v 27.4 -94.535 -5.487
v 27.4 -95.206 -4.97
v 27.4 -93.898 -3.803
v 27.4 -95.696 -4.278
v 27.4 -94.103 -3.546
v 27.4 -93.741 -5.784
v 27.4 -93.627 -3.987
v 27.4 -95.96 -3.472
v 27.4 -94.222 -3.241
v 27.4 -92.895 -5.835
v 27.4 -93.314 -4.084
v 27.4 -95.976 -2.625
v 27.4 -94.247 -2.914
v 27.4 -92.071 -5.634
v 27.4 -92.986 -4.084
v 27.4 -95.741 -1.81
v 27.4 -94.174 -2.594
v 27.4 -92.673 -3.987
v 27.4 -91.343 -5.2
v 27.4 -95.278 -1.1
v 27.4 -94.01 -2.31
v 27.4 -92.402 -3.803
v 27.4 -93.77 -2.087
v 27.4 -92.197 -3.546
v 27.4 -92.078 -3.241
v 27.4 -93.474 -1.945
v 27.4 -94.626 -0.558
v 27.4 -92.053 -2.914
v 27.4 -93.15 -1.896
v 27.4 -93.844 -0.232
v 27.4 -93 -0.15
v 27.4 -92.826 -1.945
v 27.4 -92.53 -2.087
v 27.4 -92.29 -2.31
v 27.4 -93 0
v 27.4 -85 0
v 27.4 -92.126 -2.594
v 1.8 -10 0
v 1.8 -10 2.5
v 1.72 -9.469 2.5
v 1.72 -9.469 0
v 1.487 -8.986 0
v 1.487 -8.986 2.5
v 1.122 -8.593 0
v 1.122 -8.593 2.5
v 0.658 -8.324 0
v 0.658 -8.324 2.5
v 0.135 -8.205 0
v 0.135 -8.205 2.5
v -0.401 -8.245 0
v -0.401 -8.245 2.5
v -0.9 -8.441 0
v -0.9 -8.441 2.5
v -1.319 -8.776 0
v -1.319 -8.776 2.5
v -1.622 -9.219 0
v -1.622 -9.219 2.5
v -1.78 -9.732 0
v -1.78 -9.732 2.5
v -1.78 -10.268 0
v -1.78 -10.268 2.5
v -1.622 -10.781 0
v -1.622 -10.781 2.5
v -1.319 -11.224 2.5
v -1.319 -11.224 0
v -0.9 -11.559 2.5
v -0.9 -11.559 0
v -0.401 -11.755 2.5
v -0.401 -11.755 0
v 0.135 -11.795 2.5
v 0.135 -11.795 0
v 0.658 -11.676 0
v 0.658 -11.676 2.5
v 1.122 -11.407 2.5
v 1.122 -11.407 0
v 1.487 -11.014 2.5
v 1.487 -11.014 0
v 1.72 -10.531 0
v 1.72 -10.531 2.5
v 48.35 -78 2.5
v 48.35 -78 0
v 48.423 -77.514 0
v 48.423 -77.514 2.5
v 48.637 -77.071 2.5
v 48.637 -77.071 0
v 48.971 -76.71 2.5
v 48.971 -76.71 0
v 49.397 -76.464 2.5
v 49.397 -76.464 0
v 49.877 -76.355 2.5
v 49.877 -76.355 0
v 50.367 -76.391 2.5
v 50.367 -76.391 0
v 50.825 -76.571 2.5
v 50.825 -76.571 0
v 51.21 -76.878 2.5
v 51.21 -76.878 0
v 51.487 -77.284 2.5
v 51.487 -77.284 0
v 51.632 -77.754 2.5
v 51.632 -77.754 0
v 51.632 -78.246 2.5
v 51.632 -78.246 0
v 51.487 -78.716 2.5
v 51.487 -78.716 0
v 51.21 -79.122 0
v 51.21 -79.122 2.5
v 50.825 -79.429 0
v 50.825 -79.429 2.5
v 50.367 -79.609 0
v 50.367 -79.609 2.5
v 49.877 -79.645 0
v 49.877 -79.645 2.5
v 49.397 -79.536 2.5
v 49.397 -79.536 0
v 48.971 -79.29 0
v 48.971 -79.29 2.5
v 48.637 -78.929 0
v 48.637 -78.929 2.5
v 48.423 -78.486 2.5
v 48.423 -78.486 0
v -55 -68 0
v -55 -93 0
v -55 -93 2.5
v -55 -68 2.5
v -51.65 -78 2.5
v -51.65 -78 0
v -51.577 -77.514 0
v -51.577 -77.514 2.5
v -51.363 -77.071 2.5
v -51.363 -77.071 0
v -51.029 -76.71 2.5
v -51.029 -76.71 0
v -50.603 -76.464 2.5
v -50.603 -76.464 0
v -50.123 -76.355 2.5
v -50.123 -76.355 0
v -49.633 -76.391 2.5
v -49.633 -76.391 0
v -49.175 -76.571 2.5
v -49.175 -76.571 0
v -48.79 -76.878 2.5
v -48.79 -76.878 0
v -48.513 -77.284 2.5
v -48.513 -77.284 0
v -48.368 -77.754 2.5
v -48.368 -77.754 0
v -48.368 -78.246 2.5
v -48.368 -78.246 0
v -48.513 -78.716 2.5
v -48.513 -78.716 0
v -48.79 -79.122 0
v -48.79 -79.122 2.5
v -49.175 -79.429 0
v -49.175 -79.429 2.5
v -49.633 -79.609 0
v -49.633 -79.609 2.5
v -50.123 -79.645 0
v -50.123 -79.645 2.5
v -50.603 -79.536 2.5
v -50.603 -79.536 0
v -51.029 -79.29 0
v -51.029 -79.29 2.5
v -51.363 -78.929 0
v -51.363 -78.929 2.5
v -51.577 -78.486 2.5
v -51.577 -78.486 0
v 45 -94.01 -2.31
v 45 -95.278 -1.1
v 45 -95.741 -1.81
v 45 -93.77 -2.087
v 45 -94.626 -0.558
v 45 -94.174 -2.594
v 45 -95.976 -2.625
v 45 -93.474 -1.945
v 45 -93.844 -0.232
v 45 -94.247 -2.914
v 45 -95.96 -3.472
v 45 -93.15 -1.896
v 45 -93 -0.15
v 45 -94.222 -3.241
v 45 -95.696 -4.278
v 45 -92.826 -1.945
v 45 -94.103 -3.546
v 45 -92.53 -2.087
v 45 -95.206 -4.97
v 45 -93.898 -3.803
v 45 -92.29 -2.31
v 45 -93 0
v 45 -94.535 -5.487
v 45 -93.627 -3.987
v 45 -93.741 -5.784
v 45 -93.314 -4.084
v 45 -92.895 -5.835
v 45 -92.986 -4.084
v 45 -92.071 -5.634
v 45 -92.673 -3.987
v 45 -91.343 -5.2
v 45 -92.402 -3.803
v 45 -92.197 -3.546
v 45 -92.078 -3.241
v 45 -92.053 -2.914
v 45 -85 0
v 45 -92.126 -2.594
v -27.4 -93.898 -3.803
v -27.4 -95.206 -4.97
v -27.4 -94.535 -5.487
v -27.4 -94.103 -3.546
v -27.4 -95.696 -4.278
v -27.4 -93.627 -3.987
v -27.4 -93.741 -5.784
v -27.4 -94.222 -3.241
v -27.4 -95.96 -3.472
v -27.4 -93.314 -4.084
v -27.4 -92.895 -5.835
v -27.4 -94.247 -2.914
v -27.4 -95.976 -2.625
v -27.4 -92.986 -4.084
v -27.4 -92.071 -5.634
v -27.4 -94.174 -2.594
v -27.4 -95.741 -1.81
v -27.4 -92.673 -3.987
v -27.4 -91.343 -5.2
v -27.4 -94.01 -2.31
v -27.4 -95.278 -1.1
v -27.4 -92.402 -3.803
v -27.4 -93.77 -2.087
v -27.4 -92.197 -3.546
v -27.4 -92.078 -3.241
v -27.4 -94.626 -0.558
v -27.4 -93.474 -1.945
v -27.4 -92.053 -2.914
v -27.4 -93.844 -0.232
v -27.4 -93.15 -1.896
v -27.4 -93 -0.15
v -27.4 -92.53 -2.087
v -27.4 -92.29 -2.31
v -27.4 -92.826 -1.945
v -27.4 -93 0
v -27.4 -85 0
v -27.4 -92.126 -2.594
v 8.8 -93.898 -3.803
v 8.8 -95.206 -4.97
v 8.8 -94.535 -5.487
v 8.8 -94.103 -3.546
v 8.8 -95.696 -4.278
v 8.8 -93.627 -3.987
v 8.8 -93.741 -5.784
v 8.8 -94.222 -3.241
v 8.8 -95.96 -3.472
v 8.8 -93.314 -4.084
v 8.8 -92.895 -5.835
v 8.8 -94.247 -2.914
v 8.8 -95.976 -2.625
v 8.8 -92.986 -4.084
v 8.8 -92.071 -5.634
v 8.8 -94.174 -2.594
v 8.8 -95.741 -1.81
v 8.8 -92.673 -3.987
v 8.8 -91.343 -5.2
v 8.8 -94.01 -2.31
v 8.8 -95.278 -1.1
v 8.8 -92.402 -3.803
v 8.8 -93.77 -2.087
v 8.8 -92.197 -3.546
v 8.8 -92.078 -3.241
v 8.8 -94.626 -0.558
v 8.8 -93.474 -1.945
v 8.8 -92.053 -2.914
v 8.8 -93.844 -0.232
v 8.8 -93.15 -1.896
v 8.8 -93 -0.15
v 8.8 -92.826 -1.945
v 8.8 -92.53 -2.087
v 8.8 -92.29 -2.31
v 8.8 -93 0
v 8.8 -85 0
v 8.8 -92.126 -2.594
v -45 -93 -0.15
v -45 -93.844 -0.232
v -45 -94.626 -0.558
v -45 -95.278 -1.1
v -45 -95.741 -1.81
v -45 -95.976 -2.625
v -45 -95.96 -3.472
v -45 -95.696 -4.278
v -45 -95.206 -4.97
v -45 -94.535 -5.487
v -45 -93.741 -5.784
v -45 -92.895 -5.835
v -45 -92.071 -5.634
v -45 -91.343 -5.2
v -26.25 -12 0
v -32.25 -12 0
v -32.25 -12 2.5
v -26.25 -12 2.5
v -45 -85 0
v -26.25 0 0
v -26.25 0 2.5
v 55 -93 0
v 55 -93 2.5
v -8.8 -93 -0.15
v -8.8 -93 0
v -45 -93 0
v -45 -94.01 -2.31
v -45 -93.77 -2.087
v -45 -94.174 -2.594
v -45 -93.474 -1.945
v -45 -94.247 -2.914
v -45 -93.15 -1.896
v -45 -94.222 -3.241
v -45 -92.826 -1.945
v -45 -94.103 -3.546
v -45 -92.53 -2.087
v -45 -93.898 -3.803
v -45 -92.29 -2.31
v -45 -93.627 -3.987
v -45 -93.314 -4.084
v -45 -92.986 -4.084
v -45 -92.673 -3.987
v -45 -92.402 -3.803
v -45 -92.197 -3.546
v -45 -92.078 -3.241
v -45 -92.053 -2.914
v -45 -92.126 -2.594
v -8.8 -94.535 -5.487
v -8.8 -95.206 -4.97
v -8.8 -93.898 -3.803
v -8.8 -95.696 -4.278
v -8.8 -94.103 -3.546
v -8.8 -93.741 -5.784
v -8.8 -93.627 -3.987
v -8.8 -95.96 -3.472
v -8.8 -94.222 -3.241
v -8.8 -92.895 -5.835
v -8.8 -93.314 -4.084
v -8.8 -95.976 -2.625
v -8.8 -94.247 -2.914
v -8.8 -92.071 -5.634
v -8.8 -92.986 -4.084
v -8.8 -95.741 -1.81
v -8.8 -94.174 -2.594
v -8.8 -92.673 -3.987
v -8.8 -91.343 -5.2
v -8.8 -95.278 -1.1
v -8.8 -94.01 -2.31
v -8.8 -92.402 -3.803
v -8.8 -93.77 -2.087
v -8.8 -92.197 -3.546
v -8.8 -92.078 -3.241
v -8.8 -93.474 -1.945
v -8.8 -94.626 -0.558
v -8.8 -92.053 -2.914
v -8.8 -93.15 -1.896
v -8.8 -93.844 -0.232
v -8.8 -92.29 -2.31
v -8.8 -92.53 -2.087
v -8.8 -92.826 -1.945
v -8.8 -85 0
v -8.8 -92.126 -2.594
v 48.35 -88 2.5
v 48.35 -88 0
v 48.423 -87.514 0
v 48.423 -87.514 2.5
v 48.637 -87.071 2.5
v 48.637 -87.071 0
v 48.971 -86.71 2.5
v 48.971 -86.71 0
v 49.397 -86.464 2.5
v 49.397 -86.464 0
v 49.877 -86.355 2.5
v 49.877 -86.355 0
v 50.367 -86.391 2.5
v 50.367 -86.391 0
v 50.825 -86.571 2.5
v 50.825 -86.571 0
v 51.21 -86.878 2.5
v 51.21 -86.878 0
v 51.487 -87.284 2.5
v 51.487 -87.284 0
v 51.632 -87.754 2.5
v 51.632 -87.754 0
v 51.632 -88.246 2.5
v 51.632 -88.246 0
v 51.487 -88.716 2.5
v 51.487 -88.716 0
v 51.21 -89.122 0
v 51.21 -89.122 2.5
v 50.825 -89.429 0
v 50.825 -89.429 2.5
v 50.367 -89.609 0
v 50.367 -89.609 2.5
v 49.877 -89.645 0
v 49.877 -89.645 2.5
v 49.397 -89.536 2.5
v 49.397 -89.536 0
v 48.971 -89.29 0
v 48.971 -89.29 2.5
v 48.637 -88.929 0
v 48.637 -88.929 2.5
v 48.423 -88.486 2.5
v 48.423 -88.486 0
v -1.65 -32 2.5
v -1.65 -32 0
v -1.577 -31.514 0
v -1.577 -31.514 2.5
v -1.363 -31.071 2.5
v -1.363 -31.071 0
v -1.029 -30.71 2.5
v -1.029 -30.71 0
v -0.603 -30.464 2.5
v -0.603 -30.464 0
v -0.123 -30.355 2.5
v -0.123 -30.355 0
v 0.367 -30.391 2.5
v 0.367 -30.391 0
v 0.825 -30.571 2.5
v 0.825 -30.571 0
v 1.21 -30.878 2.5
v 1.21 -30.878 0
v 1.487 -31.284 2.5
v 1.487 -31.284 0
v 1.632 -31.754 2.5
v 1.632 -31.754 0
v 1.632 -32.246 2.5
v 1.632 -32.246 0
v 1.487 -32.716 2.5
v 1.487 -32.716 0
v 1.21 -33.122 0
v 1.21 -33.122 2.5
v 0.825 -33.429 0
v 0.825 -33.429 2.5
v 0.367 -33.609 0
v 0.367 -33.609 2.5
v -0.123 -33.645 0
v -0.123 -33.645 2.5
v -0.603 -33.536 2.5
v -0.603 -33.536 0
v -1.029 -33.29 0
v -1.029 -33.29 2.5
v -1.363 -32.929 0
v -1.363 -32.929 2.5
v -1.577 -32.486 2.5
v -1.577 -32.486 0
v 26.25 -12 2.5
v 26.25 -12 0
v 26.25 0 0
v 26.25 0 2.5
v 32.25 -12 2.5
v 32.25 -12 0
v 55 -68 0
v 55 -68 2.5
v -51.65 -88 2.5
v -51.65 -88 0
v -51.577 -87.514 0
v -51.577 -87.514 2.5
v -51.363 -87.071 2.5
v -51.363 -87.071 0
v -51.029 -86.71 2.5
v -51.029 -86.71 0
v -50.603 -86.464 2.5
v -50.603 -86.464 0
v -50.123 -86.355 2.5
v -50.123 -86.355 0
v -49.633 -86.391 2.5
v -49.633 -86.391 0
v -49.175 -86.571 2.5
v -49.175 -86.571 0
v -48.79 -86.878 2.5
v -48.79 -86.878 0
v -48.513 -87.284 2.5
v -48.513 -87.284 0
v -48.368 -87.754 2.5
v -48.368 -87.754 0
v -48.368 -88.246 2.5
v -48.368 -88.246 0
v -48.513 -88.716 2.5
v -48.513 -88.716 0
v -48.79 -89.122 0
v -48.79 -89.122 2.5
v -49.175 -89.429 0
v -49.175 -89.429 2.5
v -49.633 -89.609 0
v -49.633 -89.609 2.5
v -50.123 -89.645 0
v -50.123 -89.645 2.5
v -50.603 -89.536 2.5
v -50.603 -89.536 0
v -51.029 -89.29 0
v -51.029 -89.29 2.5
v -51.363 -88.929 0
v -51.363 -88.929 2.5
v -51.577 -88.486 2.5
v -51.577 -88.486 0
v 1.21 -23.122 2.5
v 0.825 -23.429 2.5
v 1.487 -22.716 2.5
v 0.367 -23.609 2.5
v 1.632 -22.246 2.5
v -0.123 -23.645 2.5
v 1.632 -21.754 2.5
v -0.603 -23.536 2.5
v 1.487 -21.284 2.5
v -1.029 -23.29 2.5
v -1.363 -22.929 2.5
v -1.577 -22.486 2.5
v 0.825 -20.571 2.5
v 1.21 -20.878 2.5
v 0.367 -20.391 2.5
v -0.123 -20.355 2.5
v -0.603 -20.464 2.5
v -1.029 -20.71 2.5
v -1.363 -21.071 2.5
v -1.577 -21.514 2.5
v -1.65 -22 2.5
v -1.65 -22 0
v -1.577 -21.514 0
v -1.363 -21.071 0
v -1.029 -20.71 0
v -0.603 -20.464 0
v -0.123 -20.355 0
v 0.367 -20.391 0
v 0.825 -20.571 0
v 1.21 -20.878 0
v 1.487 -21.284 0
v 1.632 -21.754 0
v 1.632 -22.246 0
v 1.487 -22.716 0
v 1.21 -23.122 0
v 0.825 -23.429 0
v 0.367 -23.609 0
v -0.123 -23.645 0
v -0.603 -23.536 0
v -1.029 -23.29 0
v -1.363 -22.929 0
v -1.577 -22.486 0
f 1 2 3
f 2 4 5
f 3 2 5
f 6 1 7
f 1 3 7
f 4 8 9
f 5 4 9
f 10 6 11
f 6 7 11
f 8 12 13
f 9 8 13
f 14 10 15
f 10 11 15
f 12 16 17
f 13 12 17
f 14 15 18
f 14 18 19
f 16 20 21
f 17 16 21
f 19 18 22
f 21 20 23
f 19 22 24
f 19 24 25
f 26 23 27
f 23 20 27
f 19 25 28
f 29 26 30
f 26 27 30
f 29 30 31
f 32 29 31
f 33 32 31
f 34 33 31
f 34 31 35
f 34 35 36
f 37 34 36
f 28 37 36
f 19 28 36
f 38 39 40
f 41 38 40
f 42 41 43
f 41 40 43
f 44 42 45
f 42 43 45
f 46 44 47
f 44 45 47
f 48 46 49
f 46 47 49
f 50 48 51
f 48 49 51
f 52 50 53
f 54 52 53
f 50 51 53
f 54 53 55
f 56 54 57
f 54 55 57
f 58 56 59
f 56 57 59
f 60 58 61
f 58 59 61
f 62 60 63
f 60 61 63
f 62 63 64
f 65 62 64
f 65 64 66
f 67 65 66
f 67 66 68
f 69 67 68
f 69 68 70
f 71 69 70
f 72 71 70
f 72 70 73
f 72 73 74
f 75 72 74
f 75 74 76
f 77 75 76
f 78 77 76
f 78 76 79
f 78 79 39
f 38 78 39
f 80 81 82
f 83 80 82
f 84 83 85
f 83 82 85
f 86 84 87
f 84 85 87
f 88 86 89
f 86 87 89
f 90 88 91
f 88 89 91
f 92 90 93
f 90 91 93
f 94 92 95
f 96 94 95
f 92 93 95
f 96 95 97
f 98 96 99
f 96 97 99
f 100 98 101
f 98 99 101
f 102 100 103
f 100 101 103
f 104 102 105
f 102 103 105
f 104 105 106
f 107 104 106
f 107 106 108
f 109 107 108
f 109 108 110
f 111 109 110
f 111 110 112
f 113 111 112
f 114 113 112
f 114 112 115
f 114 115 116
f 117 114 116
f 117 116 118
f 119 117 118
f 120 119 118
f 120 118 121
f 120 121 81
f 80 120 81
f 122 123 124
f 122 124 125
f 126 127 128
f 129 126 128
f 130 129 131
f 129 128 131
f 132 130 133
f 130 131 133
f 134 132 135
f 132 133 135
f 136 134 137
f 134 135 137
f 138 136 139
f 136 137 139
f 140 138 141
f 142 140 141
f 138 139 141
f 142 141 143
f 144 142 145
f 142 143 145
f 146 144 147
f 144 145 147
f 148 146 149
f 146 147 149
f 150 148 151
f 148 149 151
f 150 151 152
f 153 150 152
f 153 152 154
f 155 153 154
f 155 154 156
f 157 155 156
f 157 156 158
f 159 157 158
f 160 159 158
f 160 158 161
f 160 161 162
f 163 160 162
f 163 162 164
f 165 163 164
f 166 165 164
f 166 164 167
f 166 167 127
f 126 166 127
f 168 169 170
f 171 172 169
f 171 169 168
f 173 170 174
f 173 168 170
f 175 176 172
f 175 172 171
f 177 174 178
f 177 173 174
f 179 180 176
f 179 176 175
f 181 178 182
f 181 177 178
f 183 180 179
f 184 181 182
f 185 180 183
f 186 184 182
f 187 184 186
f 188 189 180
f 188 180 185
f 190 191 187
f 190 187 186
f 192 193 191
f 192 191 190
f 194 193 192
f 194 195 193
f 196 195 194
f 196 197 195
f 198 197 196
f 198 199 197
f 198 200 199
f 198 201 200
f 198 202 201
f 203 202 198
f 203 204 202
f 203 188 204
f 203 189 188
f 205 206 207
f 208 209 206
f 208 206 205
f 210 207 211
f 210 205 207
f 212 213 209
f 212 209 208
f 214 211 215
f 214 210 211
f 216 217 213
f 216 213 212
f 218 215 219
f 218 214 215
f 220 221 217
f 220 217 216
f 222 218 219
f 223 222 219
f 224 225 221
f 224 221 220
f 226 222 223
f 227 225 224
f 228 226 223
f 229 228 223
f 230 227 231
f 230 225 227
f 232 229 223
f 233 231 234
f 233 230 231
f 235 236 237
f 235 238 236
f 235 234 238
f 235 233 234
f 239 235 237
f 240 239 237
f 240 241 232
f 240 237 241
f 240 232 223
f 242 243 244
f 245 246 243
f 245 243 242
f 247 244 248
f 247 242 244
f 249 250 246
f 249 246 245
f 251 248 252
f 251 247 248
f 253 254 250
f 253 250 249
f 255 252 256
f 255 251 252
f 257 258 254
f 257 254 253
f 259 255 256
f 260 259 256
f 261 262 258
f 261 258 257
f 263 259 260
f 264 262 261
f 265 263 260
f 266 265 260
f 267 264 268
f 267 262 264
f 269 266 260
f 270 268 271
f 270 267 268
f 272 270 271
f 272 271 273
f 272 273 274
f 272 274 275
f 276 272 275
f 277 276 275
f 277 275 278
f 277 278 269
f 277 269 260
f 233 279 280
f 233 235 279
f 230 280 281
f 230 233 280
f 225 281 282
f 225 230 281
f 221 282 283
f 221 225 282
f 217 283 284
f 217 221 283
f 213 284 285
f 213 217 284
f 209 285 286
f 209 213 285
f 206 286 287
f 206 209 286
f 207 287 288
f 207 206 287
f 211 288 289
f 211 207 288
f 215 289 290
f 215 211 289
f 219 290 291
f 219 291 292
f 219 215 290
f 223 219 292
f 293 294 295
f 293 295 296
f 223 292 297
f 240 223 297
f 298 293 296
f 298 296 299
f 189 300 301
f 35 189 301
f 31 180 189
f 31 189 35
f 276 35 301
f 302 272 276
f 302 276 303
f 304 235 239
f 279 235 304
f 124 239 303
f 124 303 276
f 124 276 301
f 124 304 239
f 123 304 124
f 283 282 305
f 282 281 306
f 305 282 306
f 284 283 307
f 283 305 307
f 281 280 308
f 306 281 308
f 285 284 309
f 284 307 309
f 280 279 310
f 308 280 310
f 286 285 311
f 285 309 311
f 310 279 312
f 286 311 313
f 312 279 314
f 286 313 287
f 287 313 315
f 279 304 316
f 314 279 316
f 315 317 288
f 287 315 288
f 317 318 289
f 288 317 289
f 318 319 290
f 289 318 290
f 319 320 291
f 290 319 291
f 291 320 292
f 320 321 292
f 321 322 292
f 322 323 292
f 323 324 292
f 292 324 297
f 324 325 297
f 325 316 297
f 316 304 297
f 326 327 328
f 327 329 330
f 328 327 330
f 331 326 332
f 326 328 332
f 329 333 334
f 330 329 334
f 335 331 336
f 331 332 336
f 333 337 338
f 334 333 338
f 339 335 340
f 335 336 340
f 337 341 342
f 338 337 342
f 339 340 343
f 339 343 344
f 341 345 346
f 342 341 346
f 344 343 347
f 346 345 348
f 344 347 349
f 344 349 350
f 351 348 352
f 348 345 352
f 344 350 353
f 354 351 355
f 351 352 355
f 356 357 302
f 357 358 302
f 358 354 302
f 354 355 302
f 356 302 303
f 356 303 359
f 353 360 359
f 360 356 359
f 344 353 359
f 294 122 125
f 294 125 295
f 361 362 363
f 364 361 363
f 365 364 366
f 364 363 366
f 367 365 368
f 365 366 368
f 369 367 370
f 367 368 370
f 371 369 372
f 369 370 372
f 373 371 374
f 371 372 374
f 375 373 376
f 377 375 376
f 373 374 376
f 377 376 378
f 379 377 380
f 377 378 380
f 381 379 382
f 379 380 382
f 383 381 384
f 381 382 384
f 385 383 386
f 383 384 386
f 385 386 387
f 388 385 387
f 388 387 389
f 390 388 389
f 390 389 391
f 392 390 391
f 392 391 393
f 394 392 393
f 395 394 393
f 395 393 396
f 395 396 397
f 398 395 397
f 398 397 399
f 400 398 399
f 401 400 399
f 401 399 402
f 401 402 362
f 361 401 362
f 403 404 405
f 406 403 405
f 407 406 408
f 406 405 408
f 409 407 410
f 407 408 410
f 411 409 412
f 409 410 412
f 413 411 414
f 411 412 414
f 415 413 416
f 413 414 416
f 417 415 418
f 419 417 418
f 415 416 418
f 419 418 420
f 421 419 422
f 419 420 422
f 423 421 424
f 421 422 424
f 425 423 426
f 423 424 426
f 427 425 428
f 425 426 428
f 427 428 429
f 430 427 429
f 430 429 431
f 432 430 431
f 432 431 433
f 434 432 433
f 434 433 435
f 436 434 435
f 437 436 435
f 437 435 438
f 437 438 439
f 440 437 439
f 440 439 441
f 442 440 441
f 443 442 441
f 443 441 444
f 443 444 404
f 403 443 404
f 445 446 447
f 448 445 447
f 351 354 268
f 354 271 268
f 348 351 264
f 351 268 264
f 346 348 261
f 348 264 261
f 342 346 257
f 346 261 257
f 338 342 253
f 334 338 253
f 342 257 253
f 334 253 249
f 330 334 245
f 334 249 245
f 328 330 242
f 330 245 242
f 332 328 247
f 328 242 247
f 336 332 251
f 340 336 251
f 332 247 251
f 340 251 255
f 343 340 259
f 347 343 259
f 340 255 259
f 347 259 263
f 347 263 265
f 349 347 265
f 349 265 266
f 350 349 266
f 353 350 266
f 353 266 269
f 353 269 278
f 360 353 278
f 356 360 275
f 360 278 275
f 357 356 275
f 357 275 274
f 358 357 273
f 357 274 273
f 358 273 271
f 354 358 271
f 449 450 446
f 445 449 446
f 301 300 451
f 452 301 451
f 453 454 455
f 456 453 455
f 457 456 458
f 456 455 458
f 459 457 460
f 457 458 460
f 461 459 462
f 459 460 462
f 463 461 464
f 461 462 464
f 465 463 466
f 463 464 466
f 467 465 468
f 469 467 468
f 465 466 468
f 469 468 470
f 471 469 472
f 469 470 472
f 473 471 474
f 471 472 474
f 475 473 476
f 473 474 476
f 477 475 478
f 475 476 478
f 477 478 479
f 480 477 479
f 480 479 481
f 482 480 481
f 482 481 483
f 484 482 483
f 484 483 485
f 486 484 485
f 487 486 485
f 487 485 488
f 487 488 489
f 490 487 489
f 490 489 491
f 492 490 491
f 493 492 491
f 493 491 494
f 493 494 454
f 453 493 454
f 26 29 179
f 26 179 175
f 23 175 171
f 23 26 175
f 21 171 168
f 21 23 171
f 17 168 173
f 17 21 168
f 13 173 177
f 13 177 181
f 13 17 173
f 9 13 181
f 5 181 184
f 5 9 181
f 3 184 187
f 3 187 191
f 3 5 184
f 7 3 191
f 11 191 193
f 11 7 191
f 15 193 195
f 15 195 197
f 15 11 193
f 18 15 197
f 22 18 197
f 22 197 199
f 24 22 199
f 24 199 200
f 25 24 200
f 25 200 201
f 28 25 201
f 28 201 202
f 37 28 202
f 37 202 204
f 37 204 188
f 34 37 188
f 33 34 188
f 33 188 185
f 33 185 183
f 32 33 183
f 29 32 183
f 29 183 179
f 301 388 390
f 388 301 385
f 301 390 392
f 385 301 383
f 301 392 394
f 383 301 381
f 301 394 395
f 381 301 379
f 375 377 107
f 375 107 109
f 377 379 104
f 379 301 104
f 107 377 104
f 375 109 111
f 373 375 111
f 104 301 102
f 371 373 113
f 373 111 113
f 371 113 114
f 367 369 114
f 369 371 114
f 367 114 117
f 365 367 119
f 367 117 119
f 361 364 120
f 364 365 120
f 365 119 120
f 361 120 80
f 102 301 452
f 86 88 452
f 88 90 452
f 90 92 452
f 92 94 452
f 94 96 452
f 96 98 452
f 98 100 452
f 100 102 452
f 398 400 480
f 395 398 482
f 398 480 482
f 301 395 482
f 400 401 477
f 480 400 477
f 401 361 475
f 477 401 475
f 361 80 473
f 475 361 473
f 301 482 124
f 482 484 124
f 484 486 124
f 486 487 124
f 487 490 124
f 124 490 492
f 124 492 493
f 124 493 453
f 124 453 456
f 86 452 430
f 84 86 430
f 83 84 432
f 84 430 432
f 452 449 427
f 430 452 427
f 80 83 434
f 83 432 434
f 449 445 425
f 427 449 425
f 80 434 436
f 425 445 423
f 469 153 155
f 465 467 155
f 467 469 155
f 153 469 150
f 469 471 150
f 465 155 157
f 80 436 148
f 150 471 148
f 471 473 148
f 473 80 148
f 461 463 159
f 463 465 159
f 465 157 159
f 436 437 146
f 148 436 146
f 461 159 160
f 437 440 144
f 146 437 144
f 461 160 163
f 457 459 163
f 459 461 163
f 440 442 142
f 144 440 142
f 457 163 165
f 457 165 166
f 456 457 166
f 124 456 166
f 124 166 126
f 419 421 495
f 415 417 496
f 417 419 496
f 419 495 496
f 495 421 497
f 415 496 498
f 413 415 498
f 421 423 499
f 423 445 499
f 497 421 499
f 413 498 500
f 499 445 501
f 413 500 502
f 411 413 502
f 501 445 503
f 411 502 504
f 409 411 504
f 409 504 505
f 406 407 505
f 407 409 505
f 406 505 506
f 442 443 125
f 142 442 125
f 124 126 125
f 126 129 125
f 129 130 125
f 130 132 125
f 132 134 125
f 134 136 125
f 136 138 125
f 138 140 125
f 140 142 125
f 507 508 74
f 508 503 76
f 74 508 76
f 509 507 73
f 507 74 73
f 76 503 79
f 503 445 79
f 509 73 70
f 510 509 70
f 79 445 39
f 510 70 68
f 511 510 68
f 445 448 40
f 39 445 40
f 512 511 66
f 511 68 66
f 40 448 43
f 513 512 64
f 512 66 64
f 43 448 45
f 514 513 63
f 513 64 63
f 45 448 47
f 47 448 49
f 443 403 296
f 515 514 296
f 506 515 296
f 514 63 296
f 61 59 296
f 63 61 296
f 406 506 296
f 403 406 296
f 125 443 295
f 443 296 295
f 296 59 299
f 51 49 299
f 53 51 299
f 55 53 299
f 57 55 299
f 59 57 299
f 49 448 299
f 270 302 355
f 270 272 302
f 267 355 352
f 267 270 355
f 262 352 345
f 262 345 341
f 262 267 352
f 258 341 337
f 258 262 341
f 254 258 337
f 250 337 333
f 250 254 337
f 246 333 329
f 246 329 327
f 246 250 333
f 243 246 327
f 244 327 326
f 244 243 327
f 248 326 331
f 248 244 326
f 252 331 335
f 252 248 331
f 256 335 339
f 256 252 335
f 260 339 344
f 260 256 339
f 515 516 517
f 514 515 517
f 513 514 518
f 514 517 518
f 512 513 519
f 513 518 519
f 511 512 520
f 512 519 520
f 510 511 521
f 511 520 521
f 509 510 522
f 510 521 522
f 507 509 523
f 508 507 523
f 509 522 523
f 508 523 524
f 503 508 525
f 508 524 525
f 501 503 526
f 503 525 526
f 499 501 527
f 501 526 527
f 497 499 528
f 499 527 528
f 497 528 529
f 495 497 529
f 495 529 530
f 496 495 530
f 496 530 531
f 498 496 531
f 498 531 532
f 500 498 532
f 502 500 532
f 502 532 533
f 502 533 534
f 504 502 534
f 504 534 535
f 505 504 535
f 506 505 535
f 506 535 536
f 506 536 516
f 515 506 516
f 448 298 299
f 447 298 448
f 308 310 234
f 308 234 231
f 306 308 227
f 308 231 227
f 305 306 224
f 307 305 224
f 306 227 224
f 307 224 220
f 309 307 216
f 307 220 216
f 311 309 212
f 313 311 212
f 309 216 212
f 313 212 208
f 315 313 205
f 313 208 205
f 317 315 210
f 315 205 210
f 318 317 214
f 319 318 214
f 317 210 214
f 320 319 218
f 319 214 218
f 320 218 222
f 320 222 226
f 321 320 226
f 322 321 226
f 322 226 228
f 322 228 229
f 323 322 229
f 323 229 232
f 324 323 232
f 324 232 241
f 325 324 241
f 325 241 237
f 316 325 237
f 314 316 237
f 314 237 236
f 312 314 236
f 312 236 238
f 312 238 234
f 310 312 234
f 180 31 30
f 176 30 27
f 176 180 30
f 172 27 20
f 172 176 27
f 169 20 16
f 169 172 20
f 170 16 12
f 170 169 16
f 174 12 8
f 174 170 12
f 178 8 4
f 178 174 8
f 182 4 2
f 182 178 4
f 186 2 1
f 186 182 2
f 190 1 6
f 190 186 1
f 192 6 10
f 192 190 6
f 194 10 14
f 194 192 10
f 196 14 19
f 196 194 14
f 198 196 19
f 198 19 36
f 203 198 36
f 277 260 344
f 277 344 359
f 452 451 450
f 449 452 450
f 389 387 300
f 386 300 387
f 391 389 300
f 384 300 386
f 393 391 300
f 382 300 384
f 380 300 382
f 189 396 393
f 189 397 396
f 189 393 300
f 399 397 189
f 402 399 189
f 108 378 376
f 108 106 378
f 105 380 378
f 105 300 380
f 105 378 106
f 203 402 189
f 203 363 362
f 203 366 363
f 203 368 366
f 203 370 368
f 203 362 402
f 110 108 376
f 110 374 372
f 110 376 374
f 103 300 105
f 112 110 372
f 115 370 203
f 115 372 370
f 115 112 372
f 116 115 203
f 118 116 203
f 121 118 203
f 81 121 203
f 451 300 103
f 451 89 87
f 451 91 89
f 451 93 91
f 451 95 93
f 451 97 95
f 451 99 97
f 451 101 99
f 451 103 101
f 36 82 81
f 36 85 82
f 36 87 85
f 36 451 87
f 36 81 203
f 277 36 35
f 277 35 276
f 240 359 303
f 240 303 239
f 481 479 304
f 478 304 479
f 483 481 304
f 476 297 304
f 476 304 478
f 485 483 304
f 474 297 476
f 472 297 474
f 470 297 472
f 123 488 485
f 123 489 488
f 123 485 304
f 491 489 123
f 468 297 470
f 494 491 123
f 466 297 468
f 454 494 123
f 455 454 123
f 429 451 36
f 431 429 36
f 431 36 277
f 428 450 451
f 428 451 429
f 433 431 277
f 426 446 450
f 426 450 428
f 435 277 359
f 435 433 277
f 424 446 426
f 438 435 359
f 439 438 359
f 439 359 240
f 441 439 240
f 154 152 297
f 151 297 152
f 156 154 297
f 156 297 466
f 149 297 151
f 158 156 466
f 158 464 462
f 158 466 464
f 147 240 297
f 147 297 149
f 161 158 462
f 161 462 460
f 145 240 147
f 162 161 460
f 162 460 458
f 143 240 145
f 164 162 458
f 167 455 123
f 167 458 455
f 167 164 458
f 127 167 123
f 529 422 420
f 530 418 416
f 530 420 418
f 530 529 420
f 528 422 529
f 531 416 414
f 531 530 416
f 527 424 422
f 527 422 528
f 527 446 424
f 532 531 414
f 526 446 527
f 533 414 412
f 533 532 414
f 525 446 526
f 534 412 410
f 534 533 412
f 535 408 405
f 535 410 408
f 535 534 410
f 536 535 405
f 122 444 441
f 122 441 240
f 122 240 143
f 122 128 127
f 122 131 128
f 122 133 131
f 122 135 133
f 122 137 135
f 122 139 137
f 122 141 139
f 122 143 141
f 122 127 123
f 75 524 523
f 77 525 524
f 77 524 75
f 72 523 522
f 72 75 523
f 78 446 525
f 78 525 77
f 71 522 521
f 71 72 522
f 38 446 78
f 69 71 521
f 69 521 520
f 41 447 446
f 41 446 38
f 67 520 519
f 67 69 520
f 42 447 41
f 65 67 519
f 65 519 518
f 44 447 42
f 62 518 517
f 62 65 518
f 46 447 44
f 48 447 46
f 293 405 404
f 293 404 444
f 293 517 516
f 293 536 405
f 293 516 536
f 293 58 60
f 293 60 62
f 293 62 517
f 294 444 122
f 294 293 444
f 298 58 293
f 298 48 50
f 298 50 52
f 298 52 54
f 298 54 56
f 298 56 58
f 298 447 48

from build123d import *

# Parameters (mm, degrees)
BOSS_EXTRUDE1_DEPTH  = 2.5
M3_CLEARANCE_HOLE1_D = 3.6
SKETCH4_R            = 2.85
SKETCH4_R_2          = 1.1
BOSS_EXTRUDE3_DEPTH  = 45
SKETCH5_W            = 17.6
SKETCH5_H            = 34.321917014
SKETCH5_W_2          = 0.5
CUT_EXTRUDE1_DEPTH   = 23
SKETCH6_R            = 1.65
CUT_EXTRUDE2_DEPTH   = 10
SKETCH7_R            = 1.65
CUT_EXTRUDE3_DEPTH   = 10


with BuildPart() as part:
    # Sketch1 → Boss-Extrude1 (new body)
    with BuildSketch(Plane.XY):
        Polygon((55, -68), (32.25, -12), (26.25, -12), (26.25, 0), (0, 0), (0, -93), (55, -93), align=None)
    boss_extrude1 = extrude(amount=BOSS_EXTRUDE1_DEPTH)

    # Mirror1: Boss-Extrude1 across plane
    add(boss_extrude1.mirror(Plane(origin=(0, 0, 0), x_dir=(0, 0, 1), z_dir=(1, 0, 0))))

    # M3 Clearance Hole1 (through all)
    with Locations(Plane(origin=(0, 0, 0), x_dir=(-1, 0, 0), z_dir=(0, 0, -1))):
        with Locations((0, -10)):
            Hole(M3_CLEARANCE_HOLE1_D / 2)

    # Sketch4 → Boss-Extrude3 (add, symmetric)
    # profile 1 of 2: a face of its own
    with BuildSketch(Plane(origin=(0, 0, 0), x_dir=(0, 0, -1), z_dir=(1, 0, 0))):
        with BuildLine():
            Line((5.200247424, -91.343100719), (0, -85))
            Line((0, -85), (0, -93))
            Line((0, -93), (0.150197759, -93))
            ThreePointArc((0.150197759, -93), (2.107773739, -90.442027677), (5.200247424, -91.343100719))
        make_face()
    # profile 2 of 2: a face of its own
    with BuildSketch(Plane(origin=(0, 0, 0), x_dir=(0, 0, -1), z_dir=(1, 0, 0))):
        with Locations((2.996247653, -93.15)):
            Circle(SKETCH4_R)
        with Locations(Location((2.996247653, -93.15, 0), (0, 0, 180))):
            Circle(SKETCH4_R_2, mode=Mode.SUBTRACT)
    extrude(amount=BOSS_EXTRUDE3_DEPTH, both=True)

    # Sketch5 → Cut-Extrude1 (cut)
    with BuildSketch(Plane(origin=(0, 0, 0), x_dir=(-1, 0, 0), z_dir=(0, 0, -1))):
        with Locations((-18.1, -102.160958507)):
            Rectangle(SKETCH5_W, SKETCH5_H)
        with Locations((18.1, -102.160958507)):
            Rectangle(SKETCH5_W, SKETCH5_H)
        with Locations((-27.15, -102.160958507)):
            Rectangle(SKETCH5_W_2, SKETCH5_H)
        with Locations((-9.05, -102.160958507)):
            Rectangle(SKETCH5_W_2, SKETCH5_H)
        with Locations((9.05, -102.160958507)):
            Rectangle(SKETCH5_W_2, SKETCH5_H)
        with Locations((27.15, -102.160958507)):
            Rectangle(SKETCH5_W_2, SKETCH5_H)
    extrude(amount=CUT_EXTRUDE1_DEPTH, mode=Mode.SUBTRACT)

    # Sketch6 → Cut-Extrude2 (cut)
    with BuildSketch(Plane(origin=(0, 0, 0), x_dir=(-1, 0, 0), z_dir=(0, 0, -1))):
        with Locations((-50, -88)):
            Circle(SKETCH6_R)
        with Locations((-50, -78)):
            Circle(SKETCH6_R)
        with Locations((50, -88)):
            Circle(SKETCH6_R)
        with Locations((50, -78)):
            Circle(SKETCH6_R)
    extrude(amount=-CUT_EXTRUDE2_DEPTH, mode=Mode.SUBTRACT)

    # Sketch7 → Cut-Extrude3 (cut)
    with BuildSketch(Plane(origin=(0, 0, 0), x_dir=(-1, 0, 0), z_dir=(0, 0, -1))):
        with Locations((0, -22)):
            Circle(SKETCH7_R)
        with Locations((0, -32)):
            Circle(SKETCH7_R)
    extrude(amount=-CUT_EXTRUDE3_DEPTH, mode=Mode.SUBTRACT)


solid = part.part
